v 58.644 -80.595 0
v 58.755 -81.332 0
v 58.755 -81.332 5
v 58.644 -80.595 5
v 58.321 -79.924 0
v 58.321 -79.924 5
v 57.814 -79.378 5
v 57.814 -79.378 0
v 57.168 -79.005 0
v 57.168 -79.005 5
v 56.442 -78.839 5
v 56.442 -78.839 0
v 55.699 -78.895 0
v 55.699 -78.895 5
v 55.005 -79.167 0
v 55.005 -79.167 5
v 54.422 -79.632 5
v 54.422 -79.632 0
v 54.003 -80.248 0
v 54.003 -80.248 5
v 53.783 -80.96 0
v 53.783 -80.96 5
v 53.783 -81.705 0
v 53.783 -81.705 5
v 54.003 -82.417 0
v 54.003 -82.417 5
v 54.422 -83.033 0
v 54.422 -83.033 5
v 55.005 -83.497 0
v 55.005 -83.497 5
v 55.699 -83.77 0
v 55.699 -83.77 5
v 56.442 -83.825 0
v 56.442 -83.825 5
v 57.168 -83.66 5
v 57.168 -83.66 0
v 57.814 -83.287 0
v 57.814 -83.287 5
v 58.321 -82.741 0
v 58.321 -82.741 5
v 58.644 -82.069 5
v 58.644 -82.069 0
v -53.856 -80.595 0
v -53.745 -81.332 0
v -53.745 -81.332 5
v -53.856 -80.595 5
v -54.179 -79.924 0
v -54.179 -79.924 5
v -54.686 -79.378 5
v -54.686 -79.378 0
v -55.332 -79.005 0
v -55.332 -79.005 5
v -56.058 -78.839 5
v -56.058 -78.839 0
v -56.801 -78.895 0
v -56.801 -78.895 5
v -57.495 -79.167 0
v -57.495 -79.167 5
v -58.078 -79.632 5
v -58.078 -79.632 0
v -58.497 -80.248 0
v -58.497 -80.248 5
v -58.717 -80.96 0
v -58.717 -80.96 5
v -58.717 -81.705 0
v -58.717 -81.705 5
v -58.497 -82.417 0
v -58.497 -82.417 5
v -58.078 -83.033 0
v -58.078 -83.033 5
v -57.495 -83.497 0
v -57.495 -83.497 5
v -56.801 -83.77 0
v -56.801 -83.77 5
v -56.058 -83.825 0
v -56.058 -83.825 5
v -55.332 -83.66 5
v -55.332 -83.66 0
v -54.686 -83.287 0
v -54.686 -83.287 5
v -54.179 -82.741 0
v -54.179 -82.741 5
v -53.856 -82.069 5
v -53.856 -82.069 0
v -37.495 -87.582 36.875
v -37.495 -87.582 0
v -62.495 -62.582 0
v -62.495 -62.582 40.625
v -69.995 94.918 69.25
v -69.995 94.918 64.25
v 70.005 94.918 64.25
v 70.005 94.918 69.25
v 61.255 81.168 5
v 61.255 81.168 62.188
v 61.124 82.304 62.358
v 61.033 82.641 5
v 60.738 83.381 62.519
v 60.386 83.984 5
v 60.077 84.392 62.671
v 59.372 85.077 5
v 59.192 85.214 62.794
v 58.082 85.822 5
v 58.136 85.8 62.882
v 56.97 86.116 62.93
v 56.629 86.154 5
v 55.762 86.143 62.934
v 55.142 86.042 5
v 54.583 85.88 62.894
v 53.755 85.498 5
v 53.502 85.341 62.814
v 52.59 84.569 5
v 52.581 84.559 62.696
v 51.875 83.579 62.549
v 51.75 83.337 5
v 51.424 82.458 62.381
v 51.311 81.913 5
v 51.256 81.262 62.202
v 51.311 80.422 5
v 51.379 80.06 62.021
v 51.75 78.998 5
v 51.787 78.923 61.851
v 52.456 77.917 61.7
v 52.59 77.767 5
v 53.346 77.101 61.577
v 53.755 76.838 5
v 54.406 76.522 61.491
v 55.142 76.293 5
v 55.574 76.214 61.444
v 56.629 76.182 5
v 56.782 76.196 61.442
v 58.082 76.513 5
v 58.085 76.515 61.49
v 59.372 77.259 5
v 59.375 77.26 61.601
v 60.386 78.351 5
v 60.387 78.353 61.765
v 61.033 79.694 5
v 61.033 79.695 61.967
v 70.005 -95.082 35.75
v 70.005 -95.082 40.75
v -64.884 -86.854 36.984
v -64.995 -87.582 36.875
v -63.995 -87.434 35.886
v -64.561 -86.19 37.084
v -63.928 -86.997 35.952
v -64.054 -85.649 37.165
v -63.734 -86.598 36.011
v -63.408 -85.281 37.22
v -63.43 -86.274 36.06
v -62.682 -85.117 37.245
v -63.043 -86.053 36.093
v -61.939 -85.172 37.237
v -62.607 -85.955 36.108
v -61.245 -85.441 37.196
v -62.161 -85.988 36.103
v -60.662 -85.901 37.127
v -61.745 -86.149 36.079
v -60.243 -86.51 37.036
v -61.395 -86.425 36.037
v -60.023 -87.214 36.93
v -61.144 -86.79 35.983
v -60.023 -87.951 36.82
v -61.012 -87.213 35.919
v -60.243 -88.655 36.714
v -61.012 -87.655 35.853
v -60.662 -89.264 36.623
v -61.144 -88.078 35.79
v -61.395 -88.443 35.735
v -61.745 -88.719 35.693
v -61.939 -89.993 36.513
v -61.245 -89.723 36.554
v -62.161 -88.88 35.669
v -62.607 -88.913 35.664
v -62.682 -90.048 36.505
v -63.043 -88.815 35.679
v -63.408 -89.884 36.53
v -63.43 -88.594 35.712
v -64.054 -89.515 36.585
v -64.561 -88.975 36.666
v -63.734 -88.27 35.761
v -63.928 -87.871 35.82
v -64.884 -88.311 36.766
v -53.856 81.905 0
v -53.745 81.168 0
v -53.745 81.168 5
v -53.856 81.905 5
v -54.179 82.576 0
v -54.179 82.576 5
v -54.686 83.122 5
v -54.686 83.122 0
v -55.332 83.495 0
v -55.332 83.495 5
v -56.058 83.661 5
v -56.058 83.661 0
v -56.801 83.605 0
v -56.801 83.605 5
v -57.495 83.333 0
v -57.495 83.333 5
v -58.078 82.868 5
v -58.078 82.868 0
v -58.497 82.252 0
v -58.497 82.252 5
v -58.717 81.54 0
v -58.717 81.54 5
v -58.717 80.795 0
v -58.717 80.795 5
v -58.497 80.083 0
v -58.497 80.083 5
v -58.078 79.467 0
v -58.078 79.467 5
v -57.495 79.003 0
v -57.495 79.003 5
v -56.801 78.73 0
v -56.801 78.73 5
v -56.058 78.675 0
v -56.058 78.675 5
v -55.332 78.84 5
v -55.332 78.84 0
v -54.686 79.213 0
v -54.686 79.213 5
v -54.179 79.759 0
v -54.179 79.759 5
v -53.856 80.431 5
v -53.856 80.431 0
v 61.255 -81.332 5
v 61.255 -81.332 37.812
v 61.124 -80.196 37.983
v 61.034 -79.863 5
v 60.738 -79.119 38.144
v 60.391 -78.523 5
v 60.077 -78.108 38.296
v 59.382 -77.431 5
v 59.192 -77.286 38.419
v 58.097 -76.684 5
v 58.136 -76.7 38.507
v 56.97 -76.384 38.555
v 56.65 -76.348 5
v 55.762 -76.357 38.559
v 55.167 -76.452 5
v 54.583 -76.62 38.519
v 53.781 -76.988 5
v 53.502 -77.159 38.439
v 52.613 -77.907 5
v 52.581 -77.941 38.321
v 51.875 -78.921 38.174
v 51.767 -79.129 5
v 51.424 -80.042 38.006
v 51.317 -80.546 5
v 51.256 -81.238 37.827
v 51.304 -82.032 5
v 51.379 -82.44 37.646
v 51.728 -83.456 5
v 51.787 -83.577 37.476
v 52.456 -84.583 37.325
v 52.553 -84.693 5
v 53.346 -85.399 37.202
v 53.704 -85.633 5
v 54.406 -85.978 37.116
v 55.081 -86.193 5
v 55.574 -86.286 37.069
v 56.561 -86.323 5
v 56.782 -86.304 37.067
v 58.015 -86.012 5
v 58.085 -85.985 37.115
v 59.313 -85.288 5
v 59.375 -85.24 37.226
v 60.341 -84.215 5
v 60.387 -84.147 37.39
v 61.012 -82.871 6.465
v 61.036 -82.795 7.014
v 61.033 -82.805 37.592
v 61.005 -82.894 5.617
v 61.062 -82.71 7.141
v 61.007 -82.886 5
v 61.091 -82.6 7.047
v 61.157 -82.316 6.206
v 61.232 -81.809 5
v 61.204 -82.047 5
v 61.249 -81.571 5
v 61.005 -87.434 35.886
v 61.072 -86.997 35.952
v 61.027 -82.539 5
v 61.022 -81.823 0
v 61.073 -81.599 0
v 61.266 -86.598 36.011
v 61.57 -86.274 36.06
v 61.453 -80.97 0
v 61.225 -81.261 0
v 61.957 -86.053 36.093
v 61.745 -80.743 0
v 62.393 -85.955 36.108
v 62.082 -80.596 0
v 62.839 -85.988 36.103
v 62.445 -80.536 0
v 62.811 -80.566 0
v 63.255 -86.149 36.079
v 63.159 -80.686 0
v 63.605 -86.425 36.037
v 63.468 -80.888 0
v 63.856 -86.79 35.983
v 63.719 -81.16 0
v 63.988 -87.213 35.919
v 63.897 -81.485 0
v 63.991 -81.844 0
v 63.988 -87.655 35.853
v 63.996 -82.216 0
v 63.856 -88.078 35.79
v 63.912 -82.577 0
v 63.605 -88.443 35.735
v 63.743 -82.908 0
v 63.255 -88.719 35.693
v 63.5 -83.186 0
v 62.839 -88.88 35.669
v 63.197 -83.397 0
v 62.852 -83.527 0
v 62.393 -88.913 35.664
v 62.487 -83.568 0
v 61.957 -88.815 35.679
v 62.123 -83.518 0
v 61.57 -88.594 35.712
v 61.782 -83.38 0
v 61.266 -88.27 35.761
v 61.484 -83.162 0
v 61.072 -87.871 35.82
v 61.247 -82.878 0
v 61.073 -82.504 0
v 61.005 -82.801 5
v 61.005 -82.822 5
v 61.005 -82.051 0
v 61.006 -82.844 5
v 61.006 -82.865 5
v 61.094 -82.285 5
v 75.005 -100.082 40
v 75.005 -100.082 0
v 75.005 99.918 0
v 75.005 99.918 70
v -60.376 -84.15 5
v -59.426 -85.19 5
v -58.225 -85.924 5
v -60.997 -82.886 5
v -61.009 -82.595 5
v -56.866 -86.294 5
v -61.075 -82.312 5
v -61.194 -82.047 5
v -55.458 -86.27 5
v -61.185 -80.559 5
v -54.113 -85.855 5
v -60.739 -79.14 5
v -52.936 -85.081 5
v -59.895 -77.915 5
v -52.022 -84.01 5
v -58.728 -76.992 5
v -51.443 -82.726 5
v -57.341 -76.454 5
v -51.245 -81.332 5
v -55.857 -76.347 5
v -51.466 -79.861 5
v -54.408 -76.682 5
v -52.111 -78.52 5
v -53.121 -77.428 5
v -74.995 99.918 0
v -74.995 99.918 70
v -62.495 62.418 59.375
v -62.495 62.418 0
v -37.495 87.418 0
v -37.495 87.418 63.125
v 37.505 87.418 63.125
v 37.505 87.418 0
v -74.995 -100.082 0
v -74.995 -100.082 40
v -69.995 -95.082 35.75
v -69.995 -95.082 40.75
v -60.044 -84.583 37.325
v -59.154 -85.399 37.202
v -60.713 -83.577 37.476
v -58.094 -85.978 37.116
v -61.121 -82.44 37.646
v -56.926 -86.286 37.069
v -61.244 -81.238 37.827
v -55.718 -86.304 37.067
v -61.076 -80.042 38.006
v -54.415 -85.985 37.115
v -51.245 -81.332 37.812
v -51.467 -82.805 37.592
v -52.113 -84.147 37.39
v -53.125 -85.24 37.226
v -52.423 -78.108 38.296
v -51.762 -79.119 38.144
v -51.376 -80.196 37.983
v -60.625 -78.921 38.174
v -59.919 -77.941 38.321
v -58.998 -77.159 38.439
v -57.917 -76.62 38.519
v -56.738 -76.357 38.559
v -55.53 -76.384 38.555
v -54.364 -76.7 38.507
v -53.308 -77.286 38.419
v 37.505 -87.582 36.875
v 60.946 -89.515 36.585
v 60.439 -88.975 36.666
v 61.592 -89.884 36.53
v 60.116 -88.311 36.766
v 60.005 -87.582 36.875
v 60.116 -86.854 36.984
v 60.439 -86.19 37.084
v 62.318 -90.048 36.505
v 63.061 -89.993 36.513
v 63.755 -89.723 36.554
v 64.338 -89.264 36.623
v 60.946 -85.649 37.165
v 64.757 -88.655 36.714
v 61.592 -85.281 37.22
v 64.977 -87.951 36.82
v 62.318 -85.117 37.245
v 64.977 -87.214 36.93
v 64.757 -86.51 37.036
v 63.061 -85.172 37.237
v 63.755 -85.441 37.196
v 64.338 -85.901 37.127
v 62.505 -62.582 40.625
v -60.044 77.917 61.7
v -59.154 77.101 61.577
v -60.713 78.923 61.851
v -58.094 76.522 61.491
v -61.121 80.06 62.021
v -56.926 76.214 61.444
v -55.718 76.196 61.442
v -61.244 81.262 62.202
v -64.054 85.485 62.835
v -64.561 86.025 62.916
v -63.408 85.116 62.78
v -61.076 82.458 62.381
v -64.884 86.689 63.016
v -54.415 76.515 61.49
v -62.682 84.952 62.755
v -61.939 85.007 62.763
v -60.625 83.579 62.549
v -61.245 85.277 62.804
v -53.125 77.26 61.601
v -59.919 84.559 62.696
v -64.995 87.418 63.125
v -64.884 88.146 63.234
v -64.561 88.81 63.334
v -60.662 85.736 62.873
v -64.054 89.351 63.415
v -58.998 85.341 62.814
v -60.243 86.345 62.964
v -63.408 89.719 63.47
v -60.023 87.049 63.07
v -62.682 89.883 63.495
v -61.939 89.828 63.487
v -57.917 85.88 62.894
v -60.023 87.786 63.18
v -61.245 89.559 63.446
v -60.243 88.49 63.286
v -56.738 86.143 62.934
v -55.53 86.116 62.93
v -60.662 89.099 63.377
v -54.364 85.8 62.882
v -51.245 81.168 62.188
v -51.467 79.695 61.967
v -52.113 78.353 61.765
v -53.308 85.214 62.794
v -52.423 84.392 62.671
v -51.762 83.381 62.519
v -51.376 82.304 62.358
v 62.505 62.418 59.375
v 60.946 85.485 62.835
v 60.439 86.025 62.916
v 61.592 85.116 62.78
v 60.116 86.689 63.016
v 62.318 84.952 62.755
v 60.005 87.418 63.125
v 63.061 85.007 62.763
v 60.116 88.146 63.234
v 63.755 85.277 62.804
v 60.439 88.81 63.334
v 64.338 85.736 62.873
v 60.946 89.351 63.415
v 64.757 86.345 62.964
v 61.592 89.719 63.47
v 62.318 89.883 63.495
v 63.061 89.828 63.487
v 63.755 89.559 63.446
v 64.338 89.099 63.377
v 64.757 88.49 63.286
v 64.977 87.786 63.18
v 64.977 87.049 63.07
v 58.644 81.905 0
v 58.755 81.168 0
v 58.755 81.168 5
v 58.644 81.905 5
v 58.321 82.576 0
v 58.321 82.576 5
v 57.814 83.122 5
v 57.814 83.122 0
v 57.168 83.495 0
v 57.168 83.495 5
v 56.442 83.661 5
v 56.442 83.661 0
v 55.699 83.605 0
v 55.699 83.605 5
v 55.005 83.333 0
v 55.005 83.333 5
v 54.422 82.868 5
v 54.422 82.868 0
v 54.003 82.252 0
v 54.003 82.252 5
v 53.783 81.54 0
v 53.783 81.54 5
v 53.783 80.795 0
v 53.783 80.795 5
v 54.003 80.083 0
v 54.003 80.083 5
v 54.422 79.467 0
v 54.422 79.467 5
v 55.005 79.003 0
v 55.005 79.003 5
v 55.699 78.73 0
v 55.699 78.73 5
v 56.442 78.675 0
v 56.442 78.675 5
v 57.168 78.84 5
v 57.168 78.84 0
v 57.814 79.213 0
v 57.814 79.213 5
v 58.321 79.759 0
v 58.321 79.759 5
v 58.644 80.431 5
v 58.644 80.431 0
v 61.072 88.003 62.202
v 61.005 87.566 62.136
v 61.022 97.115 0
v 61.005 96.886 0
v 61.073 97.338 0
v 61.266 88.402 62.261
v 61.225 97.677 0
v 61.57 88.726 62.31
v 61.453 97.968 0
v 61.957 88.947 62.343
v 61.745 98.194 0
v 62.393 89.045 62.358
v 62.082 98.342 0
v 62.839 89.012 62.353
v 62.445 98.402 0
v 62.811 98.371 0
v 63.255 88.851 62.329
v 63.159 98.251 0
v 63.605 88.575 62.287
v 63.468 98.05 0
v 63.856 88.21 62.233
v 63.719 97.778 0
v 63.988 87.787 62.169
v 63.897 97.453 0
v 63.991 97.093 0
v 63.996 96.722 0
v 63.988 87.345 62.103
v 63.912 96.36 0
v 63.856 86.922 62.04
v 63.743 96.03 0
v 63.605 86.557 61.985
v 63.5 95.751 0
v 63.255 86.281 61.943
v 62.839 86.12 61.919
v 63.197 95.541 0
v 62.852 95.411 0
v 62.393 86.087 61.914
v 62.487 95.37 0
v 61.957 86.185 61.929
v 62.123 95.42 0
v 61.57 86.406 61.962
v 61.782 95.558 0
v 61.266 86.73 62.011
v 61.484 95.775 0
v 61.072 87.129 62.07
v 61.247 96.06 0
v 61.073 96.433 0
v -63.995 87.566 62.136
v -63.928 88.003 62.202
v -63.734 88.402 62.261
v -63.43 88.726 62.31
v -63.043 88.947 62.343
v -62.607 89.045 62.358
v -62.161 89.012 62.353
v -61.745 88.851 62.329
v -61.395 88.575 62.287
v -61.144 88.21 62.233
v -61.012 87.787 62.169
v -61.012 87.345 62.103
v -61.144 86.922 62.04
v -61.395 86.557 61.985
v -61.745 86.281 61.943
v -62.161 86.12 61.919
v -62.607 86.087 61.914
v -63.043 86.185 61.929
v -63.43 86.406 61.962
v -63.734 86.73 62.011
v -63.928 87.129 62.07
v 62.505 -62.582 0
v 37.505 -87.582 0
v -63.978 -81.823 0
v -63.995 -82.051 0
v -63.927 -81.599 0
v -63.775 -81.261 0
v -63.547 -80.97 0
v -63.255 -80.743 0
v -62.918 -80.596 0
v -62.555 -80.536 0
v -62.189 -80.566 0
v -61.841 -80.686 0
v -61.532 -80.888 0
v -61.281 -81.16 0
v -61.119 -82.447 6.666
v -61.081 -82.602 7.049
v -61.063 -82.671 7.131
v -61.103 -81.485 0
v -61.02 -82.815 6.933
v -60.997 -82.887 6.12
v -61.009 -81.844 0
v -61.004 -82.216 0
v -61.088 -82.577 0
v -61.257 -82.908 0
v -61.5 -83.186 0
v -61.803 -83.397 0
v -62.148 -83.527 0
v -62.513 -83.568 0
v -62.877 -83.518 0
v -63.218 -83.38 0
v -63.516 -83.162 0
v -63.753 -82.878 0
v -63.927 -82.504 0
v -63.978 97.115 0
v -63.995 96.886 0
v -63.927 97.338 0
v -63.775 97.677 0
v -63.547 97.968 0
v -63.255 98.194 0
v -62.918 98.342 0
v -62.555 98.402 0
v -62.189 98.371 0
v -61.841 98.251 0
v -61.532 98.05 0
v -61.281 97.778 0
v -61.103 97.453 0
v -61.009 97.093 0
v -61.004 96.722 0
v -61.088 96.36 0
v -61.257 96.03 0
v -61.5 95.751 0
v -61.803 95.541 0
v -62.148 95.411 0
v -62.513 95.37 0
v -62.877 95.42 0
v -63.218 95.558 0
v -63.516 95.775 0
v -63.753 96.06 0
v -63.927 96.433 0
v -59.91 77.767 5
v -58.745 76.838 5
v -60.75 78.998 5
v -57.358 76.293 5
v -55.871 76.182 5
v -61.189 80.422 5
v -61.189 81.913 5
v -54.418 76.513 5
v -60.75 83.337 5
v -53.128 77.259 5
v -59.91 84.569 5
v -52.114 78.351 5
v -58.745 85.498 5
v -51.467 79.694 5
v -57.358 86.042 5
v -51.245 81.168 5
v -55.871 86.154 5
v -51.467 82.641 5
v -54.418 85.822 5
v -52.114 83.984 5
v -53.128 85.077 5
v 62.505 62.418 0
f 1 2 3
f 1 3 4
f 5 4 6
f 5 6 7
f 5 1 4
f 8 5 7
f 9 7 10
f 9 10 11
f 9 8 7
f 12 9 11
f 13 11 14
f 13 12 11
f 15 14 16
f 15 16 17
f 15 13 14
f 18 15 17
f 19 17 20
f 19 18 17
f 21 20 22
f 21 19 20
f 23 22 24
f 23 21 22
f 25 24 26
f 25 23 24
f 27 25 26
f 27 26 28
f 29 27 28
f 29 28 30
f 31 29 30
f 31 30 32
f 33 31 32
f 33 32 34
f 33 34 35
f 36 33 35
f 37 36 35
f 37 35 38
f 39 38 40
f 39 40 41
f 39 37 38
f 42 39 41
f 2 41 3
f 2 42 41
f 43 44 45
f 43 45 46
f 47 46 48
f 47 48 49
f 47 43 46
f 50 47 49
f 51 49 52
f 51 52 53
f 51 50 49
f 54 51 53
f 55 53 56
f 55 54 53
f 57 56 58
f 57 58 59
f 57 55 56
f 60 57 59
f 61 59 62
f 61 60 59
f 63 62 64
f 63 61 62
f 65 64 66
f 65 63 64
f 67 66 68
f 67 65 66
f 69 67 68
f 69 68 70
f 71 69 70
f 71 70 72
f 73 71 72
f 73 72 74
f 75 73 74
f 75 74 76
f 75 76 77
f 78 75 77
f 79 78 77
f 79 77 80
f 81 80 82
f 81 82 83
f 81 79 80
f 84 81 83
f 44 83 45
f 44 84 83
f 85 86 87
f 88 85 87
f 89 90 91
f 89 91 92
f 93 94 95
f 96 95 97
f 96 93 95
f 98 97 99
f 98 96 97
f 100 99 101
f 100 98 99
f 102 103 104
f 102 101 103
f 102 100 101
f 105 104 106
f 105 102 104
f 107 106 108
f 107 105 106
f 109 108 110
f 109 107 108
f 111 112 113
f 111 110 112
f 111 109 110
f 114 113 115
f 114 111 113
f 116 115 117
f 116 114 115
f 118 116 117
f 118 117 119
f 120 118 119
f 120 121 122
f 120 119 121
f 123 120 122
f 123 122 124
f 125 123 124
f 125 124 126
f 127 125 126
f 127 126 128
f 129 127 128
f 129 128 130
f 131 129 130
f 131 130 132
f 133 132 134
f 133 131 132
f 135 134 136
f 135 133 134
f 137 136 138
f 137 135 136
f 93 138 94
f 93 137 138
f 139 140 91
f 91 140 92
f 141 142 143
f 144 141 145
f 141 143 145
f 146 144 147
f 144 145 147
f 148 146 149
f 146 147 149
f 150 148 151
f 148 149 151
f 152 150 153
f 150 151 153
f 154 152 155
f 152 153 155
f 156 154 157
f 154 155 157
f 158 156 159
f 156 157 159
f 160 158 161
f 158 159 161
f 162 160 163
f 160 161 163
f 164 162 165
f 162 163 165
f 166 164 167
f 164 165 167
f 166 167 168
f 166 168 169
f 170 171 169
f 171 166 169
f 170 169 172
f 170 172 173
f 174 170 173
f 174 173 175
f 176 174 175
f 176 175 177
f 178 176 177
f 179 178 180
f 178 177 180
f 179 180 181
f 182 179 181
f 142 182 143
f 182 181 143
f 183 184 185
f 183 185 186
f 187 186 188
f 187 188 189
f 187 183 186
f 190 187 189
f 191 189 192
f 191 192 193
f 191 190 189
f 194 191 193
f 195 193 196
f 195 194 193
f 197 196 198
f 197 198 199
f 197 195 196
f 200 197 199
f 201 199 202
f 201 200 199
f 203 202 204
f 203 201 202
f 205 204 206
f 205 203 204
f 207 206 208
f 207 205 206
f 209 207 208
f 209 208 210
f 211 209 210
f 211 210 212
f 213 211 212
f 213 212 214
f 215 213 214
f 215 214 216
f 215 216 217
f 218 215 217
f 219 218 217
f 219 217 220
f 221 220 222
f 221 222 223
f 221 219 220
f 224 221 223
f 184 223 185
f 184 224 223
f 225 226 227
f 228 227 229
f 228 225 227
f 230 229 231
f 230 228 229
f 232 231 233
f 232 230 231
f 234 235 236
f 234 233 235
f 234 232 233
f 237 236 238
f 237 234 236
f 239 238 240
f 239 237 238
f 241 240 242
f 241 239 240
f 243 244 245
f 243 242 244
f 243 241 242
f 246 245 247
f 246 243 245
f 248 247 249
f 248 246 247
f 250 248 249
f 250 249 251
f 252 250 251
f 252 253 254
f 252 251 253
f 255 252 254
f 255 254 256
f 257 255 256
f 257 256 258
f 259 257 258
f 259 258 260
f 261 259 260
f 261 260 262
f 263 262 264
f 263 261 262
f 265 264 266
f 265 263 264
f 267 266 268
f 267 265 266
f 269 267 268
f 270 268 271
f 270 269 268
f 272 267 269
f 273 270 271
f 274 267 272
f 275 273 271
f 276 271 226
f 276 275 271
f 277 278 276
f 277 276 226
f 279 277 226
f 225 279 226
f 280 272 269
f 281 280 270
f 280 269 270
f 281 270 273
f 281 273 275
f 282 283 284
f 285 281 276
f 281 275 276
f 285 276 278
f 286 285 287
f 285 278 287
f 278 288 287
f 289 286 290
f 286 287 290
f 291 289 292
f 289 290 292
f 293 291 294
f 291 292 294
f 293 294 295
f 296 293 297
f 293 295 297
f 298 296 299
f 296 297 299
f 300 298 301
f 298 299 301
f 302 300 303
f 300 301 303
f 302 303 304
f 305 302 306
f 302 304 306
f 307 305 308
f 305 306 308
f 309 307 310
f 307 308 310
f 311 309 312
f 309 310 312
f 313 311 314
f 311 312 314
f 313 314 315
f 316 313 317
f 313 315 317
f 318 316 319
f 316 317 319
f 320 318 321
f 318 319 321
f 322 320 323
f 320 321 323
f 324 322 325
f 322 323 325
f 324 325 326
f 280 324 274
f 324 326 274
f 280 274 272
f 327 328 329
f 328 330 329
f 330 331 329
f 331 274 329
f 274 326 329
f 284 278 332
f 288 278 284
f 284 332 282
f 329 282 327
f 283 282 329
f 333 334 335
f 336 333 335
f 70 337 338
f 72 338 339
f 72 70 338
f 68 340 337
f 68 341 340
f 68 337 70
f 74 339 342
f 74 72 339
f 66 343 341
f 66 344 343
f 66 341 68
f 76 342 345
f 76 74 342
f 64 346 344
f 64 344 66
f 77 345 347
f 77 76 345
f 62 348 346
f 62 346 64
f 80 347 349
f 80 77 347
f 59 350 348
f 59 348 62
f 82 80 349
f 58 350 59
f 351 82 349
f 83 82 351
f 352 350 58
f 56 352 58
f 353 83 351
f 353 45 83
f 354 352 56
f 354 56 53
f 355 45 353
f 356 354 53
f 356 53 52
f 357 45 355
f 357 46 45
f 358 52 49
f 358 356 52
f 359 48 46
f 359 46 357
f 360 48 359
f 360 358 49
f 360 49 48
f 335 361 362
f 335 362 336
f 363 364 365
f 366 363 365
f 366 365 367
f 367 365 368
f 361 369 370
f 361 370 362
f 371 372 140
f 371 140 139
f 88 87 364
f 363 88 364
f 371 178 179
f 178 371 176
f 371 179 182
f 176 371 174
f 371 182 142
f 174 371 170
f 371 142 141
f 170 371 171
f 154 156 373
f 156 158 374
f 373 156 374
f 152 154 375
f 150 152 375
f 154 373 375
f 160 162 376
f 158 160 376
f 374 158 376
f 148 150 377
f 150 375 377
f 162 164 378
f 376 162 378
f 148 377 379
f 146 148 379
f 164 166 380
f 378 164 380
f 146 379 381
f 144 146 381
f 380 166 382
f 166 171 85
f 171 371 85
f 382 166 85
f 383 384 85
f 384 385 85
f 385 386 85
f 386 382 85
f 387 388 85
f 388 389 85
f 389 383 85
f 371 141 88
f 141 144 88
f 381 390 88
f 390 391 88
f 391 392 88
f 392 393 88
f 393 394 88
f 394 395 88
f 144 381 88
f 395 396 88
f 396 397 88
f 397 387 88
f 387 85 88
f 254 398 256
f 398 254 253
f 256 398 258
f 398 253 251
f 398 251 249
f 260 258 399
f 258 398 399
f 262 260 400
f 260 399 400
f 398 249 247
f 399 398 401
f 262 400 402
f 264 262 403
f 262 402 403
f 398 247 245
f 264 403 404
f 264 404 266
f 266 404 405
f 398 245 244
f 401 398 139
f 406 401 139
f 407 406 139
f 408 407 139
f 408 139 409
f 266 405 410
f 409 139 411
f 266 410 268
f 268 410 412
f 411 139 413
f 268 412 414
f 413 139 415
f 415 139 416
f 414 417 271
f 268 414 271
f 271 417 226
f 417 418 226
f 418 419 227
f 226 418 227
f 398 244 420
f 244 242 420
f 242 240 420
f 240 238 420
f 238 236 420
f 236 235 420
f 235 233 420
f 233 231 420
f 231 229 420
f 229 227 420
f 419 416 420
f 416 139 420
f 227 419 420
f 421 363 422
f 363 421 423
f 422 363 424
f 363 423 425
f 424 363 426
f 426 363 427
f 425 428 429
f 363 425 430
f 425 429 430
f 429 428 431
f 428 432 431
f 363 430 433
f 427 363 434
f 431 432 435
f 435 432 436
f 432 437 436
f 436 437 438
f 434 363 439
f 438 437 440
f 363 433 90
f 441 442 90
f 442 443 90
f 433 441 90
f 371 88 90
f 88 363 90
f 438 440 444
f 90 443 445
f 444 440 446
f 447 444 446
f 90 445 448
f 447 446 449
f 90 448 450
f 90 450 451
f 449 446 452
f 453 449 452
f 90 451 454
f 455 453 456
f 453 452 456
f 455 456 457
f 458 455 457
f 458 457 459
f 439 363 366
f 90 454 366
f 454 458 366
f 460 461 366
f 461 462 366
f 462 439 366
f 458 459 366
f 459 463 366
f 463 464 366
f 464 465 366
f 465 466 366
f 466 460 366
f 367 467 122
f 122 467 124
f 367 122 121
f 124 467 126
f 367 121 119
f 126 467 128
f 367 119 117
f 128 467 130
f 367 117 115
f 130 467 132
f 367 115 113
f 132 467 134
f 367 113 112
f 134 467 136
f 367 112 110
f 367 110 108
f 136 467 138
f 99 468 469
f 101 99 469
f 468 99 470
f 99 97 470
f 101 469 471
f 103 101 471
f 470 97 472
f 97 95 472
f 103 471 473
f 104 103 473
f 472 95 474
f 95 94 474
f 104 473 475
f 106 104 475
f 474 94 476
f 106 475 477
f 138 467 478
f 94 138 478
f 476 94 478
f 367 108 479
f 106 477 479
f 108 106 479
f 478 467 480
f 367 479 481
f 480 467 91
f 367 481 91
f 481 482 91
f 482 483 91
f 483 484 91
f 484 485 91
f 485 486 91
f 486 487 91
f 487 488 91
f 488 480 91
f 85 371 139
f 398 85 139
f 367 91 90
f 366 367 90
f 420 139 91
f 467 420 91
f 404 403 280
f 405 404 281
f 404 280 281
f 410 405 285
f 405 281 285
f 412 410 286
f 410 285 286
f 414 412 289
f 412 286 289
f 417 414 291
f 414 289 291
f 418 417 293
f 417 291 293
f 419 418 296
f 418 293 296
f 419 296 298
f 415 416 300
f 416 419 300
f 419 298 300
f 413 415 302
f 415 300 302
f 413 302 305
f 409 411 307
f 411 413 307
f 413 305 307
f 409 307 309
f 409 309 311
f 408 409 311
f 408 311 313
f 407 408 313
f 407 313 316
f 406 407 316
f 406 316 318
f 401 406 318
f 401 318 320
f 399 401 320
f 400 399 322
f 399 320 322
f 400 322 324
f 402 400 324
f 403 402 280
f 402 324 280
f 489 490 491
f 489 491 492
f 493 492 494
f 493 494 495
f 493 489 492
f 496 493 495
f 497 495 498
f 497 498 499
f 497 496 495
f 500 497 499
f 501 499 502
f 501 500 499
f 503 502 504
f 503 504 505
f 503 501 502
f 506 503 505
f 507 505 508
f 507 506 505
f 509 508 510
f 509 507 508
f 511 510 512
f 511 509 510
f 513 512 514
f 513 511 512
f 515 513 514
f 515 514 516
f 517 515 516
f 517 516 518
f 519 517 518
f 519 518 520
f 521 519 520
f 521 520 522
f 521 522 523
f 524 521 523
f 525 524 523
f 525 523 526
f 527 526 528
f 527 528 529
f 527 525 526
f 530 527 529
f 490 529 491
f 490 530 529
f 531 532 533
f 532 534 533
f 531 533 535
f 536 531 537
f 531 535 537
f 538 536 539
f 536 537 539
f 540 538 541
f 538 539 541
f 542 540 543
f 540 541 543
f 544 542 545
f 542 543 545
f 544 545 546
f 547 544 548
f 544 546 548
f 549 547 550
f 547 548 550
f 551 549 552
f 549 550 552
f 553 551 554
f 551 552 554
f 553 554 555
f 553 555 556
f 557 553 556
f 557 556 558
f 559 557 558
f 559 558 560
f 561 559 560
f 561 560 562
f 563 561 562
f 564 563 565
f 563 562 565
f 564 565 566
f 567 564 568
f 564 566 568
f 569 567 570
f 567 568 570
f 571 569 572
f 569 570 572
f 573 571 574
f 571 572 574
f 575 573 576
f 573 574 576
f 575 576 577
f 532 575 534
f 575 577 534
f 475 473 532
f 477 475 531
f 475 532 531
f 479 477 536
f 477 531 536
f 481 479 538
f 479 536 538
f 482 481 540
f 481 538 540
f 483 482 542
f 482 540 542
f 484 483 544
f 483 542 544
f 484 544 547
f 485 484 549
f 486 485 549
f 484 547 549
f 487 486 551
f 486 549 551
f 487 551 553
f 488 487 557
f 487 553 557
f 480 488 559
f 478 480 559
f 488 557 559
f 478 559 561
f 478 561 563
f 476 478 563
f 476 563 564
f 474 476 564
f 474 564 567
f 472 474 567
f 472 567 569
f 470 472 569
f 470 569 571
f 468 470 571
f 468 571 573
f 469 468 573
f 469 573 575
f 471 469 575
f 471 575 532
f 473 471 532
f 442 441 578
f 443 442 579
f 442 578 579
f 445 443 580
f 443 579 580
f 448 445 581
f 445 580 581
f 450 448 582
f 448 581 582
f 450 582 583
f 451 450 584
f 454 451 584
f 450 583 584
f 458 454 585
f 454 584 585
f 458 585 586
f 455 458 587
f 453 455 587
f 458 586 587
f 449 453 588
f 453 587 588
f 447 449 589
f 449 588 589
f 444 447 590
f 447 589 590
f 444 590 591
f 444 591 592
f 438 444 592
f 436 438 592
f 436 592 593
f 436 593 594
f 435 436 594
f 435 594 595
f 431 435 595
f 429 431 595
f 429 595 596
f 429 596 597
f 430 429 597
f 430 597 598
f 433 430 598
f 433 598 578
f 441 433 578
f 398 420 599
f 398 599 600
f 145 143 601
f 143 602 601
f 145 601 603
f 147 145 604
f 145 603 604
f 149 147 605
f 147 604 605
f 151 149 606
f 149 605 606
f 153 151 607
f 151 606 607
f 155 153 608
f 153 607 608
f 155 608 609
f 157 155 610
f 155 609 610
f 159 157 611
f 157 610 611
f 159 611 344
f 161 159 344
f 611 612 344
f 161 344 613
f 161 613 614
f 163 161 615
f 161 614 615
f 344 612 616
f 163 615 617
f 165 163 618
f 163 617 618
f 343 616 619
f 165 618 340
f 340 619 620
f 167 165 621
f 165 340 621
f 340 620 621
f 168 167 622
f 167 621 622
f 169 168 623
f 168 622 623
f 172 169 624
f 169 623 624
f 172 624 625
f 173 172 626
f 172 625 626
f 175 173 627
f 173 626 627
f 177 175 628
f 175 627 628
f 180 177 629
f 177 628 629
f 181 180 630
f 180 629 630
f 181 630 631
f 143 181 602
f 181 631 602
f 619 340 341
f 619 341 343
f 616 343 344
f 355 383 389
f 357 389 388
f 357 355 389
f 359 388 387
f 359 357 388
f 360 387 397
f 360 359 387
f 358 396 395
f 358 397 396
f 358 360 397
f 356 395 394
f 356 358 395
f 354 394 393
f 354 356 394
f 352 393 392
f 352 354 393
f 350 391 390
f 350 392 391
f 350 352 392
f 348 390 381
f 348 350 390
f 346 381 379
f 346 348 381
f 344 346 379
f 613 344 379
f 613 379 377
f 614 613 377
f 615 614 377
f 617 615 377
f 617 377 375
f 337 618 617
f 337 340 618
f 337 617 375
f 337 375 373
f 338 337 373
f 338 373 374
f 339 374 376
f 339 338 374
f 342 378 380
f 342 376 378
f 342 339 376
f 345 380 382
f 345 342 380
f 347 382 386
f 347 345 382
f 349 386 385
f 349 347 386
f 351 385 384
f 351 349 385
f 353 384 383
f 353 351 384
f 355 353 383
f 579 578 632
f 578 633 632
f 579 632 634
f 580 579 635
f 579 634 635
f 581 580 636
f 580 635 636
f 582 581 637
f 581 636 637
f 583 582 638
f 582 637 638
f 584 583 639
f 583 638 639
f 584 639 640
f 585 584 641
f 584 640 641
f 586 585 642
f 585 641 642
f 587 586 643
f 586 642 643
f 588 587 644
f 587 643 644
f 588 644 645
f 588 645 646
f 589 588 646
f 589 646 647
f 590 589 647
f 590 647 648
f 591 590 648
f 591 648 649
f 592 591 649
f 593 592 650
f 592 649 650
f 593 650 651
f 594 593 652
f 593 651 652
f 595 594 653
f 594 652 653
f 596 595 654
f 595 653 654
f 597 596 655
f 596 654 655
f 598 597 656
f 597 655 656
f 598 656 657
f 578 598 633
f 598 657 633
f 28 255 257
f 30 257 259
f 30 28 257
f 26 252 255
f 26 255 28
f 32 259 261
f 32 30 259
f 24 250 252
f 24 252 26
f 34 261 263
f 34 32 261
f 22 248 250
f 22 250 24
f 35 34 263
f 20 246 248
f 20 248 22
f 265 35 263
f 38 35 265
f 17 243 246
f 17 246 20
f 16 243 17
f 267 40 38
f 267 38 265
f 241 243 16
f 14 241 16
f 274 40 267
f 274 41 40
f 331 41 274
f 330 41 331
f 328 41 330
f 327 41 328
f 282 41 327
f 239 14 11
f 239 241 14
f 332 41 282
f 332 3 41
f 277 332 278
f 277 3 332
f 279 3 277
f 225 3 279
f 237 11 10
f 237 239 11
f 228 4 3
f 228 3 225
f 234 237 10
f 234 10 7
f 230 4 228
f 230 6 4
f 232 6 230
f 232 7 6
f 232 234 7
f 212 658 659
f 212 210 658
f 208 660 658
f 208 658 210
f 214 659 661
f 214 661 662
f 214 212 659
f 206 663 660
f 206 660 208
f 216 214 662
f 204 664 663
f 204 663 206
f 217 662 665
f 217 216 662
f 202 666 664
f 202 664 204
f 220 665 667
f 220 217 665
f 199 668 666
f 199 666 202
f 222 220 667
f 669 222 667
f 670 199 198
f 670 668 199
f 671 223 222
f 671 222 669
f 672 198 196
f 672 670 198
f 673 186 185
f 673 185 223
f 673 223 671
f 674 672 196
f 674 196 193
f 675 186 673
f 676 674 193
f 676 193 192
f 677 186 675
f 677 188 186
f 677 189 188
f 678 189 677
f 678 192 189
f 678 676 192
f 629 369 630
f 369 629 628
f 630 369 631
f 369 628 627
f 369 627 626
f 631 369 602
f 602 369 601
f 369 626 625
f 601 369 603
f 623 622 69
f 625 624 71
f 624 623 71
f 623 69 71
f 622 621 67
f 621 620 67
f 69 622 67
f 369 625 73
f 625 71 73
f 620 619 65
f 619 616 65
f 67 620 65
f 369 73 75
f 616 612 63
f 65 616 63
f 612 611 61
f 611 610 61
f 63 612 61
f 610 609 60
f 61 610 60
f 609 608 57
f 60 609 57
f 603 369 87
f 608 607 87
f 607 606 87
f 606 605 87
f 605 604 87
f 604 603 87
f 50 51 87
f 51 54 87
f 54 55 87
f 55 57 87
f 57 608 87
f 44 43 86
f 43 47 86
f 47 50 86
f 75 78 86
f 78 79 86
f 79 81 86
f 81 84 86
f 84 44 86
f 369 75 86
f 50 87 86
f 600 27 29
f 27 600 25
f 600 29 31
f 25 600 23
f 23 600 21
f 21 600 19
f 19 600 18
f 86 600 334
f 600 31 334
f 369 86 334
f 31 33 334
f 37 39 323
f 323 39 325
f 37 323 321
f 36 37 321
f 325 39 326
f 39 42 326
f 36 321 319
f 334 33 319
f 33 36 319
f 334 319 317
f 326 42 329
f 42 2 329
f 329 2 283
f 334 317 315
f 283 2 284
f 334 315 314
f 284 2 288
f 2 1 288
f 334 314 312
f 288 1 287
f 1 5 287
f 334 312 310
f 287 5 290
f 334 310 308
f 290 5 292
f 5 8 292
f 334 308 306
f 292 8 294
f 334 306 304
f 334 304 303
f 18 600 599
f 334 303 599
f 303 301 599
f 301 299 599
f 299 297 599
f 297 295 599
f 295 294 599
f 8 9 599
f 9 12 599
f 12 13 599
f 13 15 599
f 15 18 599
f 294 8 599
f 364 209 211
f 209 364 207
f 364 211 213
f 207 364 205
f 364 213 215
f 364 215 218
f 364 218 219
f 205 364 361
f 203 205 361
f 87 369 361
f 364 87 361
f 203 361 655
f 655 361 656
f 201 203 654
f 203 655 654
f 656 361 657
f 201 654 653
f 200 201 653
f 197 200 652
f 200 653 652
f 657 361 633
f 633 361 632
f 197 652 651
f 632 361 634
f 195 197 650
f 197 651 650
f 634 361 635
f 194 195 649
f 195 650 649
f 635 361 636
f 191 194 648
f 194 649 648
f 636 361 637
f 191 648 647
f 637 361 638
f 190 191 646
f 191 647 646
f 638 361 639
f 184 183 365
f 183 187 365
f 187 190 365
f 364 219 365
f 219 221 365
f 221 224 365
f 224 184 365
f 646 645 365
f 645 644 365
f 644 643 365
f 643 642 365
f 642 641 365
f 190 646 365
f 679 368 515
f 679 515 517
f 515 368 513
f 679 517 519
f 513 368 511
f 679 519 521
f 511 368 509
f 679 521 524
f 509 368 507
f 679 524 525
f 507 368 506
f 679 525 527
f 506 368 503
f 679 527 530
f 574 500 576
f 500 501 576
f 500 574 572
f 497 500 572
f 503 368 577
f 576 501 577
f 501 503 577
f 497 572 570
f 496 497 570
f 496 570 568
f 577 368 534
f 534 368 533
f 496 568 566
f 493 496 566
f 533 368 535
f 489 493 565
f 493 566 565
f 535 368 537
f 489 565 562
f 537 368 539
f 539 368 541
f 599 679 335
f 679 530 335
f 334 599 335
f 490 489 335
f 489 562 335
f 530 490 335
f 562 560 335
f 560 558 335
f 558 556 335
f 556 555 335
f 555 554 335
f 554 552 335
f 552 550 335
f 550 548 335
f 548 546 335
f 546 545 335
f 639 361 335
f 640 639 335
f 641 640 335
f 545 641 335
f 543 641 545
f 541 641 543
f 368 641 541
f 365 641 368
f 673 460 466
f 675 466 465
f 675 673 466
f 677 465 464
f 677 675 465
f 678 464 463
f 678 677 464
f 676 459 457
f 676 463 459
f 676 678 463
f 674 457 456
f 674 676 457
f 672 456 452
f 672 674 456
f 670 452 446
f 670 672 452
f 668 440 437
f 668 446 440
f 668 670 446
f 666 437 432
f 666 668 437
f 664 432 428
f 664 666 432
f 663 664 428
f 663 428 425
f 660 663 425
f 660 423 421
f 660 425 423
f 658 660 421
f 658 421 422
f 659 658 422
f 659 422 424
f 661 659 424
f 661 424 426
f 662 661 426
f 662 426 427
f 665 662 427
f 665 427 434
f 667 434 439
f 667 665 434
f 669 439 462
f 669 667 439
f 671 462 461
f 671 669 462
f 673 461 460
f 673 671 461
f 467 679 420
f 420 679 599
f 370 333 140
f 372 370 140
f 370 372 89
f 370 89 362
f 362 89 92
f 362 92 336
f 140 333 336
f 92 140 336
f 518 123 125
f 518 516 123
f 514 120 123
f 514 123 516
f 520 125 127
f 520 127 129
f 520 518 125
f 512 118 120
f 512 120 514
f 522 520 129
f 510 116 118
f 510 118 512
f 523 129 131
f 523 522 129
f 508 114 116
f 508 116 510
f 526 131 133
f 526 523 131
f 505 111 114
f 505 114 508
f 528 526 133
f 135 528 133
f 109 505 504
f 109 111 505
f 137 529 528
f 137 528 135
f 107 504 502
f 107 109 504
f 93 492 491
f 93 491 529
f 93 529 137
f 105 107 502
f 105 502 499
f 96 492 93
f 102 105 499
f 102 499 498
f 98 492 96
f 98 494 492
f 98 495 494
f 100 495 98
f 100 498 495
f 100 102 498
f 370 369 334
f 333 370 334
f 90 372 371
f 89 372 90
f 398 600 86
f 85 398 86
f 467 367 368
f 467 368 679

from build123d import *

# Parameters (mm, degrees)
F0_W           = 150
F0_H           = 200
F0_W_2         = 137.5
F0_H_2         = 187.5
F0_R           = 5
F1_DEPTH       = 70
F3_DEPTH       = 155
F5_START       = -5
F5_DEPTH       = 140
F0_R_2         = 2.5
F6_DEPTH       = 5
F8_D           = 3
F8_CSINK_D     = 5
F8_CSINK_ANGLE = 90


with BuildPart() as f1:
    # F0 (on Top) → F1 (new body)
    with BuildSketch(Plane.XY):
        with Locations((0.0049619689, -0.0823242008)):
            Rectangle(F0_W, F0_H)
        with Locations((0.0049619689, -0.0823242008)):
            Rectangle(F0_W_2, F0_H_2, mode=Mode.SUBTRACT)
        with Locations((0.0049619689, -0.0823242008)):
            Rectangle(F0_W_2, F0_H_2)
        Polygon((-62.4950380311, 62.4176757992), (-62.4950380311, 87.4176757992), (-37.4950380311, 87.4176757992), (37.5049619689, 87.4176757992), (62.5049619689, 87.4176757992), (62.5049619689, 62.4176757992), (62.5049619689, -62.5823242008), (62.5049619689, -87.5823242008), (37.5049619689, -87.5823242008), (-37.4950380311, -87.5823242008), (-62.4950380311, -87.5823242008), (-62.4950380311, -62.5823242008), align=None, mode=Mode.SUBTRACT)
        Polygon((-37.4950380311, 87.4176757992), (-62.4950380311, 87.4176757992), (-62.4950380311, 62.4176757992), align=None)
        with Locations((-56.2450380311, 81.1676757992)):
            Circle(F0_R, mode=Mode.SUBTRACT)
        Polygon((62.5049619689, 87.4176757992), (37.5049619689, 87.4176757992), (62.5049619689, 62.4176757992), align=None)
        with Locations((56.2549619689, 81.1676757992)):
            Circle(F0_R, mode=Mode.SUBTRACT)
        Polygon((62.5049619689, -87.5823242008), (62.5049619689, -62.5823242008), (37.5049619689, -87.5823242008), align=None)
        with Locations((56.2549619689, -81.3323242008)):
            Circle(F0_R, mode=Mode.SUBTRACT)
        Polygon((-37.4950380311, -87.5823242008), (-62.4950380311, -62.5823242008), (-62.4950380311, -87.5823242008), align=None)
        with Locations((-56.2450380311, -81.3323242008)):
            Circle(F0_R, mode=Mode.SUBTRACT)
    extrude(amount=F1_DEPTH)

    # F2 (on face) → F3 (cut)
    with BuildSketch(Plane.YZ.offset(75.0049619689)):
        Polygon((-100.0823242008, 70), (-100.0823242008, 40), (99.9176757992, 70), align=None)
    extrude(amount=-F3_DEPTH, mode=Mode.SUBTRACT)

    # F4 (on face) → F5 (cut)
    with BuildSketch(Plane.YZ.offset(75.0049619689).offset(F5_START)):
        Polygon((94.9176757992, 69.25), (-95.0823242008, 40.75), (-95.0823242008, 35.75), (94.9176757992, 64.25), align=None)
    extrude(amount=-F5_DEPTH, mode=Mode.SUBTRACT)

    # F0 (on Top) → F6 (join)
    with BuildSketch(Plane.XY):
        with Locations((-56.2450380311, 81.1676757992)):
            Circle(F0_R)
        with Locations((-56.2450380311, 81.1676757992)):
            Circle(F0_R_2, mode=Mode.SUBTRACT)
        with Locations((56.2549619689, 81.1676757992)):
            Circle(F0_R)
        with Locations((56.2549619689, 81.1676757992)):
            Circle(F0_R_2, mode=Mode.SUBTRACT)
        with Locations((-56.2450380311, -81.3323242008)):
            Circle(F0_R)
        with Locations((-56.2450380311, -81.3323242008)):
            Circle(F0_R_2, mode=Mode.SUBTRACT)
        with Locations((56.2549619689, -81.3323242008)):
            Circle(F0_R)
        with Locations((56.2549619689, -81.3323242008)):
            Circle(F0_R_2, mode=Mode.SUBTRACT)
    extrude(amount=F6_DEPTH)

    # F8 (through all)
    with Locations(Plane(origin=(0, -7.3367748602, 48.9118324011), x_dir=(1, 0, 0), z_dir=(0, -0.1483404529, 0.9889363529))):
        with Locations((-62.4950380311, 95.8145085723), (62.5049619689, 95.8145085723), (62.5049619689, -81.143290069), (-62.4950380311, -81.143290069)):
            CounterSinkHole(F8_D / 2, F8_CSINK_D / 2, counter_sink_angle=F8_CSINK_ANGLE)


solid = f1.part
